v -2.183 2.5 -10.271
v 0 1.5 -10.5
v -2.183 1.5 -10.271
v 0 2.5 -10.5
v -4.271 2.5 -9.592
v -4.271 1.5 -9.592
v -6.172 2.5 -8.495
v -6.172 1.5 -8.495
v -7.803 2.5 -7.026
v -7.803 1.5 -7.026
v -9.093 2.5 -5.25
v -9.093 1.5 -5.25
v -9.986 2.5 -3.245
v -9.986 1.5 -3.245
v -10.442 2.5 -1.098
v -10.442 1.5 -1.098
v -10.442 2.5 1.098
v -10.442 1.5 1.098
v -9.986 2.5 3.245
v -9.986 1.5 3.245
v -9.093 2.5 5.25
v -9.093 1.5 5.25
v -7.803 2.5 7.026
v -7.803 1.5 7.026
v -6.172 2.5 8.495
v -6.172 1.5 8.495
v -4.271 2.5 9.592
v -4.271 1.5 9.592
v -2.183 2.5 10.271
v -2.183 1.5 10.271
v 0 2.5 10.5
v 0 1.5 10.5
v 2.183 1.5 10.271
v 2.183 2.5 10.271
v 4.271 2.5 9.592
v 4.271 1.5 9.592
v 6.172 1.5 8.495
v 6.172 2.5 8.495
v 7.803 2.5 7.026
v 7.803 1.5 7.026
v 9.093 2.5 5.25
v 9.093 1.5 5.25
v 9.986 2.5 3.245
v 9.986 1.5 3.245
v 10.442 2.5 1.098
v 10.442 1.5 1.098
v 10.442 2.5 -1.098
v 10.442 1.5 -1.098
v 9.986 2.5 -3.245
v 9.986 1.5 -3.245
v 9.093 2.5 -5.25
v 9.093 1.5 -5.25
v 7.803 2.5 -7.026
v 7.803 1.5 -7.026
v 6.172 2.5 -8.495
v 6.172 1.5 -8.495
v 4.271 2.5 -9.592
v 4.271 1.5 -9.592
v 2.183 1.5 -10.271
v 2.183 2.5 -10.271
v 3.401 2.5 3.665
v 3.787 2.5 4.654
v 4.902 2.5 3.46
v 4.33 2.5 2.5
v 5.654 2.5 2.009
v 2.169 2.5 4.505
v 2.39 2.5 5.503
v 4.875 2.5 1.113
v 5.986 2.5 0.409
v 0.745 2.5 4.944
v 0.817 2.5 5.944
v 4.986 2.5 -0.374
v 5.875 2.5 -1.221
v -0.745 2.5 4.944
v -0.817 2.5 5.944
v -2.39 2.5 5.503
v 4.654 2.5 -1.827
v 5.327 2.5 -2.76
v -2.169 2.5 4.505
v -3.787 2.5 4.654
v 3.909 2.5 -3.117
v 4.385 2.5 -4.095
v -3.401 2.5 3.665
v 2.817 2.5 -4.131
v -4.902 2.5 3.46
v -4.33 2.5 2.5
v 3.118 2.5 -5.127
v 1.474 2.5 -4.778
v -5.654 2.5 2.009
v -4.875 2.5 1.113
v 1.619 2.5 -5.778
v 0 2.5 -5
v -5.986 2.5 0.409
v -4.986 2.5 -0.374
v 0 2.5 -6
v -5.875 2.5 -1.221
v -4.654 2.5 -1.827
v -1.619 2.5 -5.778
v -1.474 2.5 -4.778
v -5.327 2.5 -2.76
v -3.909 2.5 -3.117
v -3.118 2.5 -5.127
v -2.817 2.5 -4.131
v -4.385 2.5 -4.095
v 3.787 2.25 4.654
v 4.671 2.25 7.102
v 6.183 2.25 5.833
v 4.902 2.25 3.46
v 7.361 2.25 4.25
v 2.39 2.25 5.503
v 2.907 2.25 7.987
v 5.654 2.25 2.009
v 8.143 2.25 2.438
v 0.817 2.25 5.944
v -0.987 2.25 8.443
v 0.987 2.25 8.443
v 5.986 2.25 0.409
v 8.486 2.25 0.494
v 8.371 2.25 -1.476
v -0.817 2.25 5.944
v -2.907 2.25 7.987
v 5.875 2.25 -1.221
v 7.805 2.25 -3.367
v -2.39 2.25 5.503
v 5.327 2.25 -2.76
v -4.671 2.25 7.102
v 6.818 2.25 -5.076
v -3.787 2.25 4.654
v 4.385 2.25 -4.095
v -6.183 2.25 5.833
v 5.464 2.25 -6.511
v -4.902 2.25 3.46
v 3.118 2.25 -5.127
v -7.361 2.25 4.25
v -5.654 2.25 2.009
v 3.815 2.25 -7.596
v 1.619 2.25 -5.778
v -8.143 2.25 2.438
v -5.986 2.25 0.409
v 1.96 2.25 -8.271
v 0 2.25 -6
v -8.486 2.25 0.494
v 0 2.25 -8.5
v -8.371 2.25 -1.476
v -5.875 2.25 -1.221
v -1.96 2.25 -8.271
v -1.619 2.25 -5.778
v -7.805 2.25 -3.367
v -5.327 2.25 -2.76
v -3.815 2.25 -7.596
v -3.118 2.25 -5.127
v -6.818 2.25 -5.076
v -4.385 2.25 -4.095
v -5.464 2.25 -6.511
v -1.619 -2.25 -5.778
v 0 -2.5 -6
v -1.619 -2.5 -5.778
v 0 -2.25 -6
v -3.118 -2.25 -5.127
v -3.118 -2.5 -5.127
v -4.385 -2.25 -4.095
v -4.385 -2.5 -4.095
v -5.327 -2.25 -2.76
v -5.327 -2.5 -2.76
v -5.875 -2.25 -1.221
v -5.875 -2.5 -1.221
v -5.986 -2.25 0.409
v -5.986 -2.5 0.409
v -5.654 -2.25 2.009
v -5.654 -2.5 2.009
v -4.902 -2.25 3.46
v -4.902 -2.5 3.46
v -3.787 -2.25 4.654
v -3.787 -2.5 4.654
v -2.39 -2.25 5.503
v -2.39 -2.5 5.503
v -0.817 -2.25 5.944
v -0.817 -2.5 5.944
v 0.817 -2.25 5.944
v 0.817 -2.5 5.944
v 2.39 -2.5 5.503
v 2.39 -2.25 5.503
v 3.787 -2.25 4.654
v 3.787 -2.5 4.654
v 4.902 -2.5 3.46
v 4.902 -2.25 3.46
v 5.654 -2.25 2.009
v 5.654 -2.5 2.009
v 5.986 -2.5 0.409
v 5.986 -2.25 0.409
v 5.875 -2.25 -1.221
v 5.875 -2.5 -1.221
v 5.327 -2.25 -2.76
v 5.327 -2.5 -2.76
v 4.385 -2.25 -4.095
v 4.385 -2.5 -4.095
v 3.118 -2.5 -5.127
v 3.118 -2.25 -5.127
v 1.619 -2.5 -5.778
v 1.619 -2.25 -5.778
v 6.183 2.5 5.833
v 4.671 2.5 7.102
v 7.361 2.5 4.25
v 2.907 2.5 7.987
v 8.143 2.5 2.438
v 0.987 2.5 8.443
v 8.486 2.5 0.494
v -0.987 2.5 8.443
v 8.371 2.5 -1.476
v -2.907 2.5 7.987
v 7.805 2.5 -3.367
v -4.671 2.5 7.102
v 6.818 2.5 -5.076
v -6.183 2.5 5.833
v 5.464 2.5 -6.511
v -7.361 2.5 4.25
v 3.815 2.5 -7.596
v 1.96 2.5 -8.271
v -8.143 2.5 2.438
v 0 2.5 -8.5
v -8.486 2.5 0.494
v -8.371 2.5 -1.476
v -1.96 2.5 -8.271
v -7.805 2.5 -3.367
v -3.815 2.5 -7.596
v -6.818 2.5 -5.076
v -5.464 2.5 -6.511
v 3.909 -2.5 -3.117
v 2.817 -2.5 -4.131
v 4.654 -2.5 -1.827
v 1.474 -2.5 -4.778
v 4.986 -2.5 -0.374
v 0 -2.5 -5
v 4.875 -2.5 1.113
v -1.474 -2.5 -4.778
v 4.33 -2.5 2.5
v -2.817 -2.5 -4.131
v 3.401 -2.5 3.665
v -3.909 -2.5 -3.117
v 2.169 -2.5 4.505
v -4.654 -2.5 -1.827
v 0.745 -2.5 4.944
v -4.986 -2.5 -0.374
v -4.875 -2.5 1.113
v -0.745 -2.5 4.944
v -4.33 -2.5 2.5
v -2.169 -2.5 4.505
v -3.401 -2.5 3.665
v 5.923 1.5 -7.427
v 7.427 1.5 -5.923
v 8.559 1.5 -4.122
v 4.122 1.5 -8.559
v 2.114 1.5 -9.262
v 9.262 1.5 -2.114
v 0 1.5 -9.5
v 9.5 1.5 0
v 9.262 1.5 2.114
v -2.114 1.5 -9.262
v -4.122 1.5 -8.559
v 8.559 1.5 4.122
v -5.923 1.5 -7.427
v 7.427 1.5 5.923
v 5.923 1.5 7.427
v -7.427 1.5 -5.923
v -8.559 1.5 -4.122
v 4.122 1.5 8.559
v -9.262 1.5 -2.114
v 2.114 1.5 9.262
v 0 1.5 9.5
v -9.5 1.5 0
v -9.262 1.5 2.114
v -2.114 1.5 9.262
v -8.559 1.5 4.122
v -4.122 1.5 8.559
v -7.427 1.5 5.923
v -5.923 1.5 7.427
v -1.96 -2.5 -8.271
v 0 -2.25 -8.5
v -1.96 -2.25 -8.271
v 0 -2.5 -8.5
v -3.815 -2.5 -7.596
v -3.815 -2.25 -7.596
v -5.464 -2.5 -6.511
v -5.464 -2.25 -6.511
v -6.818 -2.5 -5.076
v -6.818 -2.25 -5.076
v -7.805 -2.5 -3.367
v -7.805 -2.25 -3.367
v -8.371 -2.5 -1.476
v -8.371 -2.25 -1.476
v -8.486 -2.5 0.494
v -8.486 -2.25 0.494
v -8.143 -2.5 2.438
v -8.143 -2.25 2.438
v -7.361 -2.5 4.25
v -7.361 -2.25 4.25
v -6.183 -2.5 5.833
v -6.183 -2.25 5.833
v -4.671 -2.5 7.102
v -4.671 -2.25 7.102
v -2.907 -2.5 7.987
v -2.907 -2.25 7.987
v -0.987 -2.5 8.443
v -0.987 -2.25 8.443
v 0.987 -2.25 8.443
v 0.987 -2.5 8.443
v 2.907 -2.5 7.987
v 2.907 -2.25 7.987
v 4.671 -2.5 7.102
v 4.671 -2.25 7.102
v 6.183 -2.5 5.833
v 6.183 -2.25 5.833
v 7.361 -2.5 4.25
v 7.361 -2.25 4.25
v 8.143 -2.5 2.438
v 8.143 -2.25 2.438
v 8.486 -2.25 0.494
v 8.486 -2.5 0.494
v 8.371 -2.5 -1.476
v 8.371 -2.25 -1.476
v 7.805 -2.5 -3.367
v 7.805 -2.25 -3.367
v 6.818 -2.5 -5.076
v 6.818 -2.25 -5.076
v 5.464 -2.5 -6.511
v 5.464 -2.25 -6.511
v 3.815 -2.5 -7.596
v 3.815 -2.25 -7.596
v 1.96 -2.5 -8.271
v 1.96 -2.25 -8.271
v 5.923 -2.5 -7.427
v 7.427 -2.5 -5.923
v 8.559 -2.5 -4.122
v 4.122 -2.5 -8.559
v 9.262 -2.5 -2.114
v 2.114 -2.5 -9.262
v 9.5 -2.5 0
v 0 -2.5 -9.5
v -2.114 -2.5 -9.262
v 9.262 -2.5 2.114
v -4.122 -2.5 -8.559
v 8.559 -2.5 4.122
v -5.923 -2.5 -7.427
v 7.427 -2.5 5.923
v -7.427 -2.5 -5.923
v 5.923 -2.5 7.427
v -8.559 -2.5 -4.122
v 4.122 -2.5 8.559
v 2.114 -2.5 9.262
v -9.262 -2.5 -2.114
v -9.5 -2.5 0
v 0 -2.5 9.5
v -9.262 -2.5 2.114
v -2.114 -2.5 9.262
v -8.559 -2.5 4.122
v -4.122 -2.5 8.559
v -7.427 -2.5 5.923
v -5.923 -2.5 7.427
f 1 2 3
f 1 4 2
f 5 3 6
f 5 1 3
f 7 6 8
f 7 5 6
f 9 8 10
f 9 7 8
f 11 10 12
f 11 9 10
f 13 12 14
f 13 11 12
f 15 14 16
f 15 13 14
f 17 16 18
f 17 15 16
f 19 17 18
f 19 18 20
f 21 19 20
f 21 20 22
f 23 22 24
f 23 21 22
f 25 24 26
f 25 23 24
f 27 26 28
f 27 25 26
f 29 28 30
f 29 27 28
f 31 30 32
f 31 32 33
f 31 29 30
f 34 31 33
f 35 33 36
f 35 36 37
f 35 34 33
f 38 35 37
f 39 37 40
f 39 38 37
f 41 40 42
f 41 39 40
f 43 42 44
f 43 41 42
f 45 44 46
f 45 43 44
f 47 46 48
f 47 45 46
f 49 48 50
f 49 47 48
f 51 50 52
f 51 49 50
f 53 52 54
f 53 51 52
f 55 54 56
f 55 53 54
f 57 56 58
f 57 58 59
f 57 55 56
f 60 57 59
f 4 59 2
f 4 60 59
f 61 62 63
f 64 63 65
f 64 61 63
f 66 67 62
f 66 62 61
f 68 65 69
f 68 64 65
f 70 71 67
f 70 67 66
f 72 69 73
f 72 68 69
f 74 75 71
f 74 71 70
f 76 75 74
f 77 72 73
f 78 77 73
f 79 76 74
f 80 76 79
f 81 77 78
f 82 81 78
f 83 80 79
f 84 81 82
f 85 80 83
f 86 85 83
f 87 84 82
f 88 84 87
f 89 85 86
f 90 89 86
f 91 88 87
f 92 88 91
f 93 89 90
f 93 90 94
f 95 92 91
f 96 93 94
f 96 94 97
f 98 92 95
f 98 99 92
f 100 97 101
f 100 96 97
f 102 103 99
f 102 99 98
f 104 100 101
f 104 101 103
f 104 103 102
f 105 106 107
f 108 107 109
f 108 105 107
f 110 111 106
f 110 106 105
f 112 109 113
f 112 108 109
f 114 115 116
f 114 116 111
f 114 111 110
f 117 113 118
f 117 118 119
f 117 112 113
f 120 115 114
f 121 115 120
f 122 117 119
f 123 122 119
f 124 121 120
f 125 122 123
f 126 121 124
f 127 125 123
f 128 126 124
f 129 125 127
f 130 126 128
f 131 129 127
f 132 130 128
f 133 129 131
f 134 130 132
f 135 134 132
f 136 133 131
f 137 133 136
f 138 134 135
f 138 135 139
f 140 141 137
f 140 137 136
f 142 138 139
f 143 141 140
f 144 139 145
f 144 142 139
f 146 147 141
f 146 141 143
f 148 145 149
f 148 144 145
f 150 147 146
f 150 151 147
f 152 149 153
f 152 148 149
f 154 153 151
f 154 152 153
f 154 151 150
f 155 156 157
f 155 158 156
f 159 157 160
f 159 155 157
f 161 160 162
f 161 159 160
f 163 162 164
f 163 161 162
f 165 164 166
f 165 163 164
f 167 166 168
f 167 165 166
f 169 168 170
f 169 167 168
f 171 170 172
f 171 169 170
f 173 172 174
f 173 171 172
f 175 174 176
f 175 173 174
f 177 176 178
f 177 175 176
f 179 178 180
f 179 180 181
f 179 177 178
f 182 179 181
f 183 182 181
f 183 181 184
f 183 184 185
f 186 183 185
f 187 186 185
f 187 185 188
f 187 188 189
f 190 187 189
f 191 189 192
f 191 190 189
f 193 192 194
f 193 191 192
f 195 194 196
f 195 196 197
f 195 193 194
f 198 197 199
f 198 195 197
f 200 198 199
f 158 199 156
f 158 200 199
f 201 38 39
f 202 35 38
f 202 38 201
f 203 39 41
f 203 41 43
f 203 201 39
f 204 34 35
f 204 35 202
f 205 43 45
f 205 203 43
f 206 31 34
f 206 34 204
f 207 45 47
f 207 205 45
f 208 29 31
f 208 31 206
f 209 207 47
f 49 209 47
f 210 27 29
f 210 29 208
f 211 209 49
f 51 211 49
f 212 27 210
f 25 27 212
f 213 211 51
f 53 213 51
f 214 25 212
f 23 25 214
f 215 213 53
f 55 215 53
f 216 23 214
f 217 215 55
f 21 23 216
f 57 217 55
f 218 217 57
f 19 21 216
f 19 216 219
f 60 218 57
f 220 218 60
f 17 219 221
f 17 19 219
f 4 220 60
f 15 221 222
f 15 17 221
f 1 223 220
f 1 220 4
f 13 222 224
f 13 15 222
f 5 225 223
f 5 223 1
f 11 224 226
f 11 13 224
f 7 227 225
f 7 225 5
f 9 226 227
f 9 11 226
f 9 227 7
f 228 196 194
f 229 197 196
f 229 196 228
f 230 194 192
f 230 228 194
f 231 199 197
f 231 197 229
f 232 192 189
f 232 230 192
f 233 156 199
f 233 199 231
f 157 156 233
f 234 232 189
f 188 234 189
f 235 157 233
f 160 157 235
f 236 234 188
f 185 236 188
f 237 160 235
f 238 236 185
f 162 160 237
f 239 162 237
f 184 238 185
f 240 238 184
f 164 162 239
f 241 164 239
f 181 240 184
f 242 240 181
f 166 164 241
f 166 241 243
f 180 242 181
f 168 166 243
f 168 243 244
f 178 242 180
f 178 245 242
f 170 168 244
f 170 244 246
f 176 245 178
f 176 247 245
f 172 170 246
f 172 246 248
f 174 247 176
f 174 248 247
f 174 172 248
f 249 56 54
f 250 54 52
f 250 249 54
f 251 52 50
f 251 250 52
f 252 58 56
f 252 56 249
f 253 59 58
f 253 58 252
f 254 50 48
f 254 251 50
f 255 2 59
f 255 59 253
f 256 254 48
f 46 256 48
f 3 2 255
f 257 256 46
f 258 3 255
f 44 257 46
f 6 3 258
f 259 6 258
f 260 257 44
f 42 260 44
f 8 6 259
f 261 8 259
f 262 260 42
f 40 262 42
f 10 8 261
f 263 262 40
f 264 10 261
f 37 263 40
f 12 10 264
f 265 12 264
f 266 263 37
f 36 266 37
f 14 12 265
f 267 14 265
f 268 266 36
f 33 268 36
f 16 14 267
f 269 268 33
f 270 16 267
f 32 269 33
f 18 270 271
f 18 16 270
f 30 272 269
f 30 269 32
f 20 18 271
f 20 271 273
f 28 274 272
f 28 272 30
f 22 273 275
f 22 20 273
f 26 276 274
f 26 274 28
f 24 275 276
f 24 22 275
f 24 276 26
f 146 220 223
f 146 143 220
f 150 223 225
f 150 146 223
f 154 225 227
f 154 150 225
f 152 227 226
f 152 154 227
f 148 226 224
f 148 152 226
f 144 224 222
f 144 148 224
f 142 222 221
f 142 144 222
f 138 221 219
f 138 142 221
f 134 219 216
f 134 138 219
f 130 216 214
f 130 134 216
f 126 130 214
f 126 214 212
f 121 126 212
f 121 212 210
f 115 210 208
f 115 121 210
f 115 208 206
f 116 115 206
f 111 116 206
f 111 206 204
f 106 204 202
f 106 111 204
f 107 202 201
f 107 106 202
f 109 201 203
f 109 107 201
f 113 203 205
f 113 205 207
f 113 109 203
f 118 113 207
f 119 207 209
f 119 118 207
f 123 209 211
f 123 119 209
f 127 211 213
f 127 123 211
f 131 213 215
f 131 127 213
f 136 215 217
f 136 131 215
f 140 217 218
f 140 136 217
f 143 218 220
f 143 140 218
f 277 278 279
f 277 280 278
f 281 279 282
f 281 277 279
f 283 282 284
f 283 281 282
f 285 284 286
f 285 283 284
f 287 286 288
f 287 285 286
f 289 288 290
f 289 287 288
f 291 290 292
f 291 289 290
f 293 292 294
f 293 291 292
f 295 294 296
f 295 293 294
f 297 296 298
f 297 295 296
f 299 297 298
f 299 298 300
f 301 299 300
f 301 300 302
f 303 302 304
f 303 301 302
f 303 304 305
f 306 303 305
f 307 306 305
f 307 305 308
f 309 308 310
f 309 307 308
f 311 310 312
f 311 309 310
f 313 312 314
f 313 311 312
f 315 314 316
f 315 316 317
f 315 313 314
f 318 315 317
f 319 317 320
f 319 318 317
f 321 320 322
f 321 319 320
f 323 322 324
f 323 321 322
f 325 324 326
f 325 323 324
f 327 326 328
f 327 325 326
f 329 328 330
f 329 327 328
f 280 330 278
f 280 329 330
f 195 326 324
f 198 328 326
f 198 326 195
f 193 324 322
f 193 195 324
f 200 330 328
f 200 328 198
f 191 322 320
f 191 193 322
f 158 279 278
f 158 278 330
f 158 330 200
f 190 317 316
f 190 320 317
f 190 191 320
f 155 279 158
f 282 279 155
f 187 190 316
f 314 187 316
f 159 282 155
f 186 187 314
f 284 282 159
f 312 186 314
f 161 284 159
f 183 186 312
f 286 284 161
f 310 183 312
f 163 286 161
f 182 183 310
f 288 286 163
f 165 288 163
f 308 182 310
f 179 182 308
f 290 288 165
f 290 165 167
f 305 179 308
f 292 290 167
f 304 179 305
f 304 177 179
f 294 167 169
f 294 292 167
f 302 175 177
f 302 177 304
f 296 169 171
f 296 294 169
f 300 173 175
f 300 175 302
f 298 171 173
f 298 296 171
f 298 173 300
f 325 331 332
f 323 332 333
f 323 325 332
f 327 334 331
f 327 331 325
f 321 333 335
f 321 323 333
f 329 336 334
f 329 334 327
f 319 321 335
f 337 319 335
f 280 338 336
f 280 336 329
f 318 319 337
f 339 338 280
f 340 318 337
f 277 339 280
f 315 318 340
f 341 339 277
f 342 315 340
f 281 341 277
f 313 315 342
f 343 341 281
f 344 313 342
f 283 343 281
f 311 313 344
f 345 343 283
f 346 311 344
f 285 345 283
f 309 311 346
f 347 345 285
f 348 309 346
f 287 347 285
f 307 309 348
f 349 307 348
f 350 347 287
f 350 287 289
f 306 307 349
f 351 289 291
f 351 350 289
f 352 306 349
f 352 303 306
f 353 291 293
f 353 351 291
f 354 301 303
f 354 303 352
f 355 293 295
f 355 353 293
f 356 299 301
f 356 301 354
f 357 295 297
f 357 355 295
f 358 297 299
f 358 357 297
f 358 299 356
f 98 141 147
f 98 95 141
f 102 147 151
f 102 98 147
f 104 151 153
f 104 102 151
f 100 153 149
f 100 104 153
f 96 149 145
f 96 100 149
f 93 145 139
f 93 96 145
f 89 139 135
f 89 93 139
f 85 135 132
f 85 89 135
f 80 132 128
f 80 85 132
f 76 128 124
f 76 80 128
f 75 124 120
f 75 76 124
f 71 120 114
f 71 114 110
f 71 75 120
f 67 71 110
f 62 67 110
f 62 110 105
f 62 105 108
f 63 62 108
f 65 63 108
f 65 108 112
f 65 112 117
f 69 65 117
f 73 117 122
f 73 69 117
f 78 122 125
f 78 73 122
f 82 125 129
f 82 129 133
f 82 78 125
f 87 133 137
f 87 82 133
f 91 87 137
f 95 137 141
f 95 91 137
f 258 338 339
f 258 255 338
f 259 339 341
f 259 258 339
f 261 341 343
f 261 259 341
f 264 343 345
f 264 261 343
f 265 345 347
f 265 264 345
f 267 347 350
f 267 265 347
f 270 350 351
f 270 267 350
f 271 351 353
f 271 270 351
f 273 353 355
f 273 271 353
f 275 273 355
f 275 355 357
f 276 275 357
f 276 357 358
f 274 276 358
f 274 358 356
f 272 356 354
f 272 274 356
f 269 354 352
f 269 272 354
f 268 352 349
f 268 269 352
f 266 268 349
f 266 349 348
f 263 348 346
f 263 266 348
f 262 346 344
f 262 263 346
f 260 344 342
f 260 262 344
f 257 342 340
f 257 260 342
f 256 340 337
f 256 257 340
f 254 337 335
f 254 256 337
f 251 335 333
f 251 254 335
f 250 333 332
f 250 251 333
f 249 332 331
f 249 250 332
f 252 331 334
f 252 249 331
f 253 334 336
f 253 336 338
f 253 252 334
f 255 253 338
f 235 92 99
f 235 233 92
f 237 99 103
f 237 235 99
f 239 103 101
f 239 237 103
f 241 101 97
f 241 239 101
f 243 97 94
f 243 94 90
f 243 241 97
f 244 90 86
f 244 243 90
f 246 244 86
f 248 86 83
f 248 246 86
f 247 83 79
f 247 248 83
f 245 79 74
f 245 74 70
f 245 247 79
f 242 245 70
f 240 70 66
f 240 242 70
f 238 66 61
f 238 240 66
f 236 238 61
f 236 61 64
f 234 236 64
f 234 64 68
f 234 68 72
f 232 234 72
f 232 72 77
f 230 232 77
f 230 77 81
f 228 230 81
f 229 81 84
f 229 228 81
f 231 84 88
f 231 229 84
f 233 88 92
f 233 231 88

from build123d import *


with BuildPart() as part:
    # 草图2 → 旋转1 (revolve)
    with BuildSketch(Plane.XY, mode=Mode.PRIVATE) as revolve_1_sk:
        Polygon((5, 2.5), (5, -2.5), (6, -2.5), (6, -2.25), (8.5, -2.25), (8.5, -2.5), (9.5, -2.5), (9.5, 1.5), (10.5, 1.5), (10.5, 2.5), (9.5, 2.5), (8.5, 2.5), (8.5, 2.25), (6, 2.25), (6, 2.5), align=None)
    revolve(revolve_1_sk.sketch.rotate(Axis((0, 0, 0), (0, 1, 0)), 90), axis=Axis((0, 0, 0), (0, 1, 0)))


solid = part.part
